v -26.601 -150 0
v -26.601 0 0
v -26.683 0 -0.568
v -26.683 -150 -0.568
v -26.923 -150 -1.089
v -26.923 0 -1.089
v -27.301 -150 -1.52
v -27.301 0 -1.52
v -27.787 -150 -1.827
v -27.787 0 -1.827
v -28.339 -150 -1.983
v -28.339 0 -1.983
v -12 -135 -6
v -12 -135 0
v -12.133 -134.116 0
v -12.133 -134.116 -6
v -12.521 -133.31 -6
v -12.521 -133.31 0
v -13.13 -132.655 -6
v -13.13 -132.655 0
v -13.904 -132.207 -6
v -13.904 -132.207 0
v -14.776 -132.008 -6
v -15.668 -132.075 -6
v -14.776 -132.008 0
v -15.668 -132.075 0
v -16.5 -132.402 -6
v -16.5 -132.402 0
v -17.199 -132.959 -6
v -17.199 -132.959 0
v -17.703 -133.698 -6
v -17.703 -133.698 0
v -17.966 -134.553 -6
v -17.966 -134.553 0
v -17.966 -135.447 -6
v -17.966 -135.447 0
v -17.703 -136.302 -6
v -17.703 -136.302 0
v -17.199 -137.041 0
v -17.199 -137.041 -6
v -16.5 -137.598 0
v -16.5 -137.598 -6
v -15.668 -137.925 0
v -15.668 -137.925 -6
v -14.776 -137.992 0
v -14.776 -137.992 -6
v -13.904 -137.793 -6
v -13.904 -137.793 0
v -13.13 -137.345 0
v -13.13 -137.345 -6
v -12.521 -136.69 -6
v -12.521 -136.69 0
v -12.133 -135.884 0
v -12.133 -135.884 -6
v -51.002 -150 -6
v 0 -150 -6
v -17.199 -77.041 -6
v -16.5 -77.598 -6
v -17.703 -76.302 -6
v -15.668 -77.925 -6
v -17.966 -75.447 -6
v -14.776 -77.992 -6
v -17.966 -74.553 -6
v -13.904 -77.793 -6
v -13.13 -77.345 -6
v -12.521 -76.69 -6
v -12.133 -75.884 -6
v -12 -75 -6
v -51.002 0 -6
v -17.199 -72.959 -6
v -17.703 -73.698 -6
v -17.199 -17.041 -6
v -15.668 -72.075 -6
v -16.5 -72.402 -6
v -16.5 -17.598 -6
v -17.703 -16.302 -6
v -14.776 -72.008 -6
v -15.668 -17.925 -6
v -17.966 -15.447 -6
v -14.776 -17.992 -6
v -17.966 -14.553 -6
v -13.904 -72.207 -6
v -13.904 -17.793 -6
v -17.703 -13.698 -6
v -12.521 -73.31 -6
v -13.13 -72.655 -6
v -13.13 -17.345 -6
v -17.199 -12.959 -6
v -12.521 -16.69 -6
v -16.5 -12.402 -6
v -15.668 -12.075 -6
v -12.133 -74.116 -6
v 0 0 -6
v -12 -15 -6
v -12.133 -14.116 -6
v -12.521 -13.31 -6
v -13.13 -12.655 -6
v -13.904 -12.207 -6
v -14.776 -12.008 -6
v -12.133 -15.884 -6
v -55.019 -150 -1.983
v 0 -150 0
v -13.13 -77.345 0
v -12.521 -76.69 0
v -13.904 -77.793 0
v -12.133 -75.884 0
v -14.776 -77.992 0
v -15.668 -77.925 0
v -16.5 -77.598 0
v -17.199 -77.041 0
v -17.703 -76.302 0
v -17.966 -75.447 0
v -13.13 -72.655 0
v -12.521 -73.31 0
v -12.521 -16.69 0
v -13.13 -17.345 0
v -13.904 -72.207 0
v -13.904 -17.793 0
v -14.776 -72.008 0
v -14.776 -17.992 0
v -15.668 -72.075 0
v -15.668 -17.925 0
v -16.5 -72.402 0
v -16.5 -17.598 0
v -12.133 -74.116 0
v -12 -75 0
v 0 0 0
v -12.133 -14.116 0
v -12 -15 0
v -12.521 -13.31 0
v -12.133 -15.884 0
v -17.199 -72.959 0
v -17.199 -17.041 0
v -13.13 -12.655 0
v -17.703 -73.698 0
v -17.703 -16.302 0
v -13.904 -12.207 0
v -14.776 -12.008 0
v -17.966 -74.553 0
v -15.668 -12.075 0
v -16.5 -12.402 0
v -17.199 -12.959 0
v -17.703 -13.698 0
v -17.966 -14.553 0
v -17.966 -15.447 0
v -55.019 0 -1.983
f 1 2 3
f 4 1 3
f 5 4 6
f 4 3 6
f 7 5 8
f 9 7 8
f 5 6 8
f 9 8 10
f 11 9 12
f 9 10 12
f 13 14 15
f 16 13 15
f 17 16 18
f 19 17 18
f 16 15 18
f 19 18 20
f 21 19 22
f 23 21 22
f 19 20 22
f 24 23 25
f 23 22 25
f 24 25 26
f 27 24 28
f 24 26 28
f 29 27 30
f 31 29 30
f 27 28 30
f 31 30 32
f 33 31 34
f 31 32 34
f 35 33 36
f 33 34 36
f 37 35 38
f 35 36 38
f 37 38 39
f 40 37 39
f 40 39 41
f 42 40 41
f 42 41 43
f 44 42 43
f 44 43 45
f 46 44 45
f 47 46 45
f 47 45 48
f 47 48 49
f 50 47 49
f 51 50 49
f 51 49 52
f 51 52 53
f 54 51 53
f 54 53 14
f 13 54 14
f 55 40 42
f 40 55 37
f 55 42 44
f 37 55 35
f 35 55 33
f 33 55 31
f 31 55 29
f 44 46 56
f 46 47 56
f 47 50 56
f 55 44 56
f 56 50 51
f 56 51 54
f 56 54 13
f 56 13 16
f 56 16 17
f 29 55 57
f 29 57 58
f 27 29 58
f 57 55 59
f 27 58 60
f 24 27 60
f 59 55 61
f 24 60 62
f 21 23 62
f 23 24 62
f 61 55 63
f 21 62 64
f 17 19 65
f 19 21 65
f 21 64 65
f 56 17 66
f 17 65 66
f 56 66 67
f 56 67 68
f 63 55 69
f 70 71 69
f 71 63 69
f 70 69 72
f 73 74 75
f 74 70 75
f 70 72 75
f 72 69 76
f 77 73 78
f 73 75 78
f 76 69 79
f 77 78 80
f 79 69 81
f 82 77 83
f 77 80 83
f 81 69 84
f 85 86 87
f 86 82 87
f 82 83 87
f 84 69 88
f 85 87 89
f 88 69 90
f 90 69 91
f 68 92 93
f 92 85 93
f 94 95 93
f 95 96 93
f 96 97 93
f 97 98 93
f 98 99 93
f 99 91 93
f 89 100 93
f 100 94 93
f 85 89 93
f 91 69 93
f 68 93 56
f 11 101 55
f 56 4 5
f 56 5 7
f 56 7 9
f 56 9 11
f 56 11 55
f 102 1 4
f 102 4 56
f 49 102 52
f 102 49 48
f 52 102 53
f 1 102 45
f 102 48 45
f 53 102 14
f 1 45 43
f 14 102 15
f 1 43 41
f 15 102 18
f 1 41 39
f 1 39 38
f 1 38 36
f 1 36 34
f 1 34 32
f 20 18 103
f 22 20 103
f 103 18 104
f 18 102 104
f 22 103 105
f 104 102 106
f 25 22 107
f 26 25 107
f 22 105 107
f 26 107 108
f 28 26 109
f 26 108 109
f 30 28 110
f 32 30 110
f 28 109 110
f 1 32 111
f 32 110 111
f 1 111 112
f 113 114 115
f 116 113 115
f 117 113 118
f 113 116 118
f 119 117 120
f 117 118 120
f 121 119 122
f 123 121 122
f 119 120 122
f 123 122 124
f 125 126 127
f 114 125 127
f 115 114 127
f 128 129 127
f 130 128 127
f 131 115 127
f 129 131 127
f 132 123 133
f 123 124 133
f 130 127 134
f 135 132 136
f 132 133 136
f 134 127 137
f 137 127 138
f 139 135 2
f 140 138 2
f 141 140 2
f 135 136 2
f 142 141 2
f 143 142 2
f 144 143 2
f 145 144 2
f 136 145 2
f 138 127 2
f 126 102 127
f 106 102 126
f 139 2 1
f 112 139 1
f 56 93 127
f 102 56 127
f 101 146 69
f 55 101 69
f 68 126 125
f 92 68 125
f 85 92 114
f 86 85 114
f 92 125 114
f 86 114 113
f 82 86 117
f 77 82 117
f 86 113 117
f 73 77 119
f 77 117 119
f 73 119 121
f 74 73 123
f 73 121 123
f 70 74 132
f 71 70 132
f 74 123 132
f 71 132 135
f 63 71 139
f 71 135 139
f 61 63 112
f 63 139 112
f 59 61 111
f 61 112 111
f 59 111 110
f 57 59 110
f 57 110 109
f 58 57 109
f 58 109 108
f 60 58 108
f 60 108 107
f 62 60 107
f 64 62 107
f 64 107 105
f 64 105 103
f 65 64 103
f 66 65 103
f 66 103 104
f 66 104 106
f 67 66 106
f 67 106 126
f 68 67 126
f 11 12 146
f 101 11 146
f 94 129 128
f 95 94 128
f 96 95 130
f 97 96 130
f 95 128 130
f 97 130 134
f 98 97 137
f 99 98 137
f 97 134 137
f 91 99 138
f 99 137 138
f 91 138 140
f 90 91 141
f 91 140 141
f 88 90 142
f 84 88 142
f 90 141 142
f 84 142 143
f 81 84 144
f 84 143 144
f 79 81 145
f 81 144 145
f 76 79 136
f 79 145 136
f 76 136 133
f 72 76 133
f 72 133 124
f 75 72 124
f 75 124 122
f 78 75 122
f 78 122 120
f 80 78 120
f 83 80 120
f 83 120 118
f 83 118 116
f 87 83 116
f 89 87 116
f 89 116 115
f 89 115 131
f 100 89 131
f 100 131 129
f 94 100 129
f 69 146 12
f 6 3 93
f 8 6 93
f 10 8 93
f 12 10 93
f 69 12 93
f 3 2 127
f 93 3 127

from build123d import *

# Parameters (mm, degrees)
F1_DEPTH = 150
F3_R     = 3
F4_DEPTH = 25


with BuildPart() as f1:
    # F0 (on Front) → F1 (new body)
    with BuildSketch(Plane.XZ):
        with BuildLine():
            Line((0, -6), (0, 0))
            Line((0, 0), (-26.600782156, 0))
            ThreePointArc((-26.600782156, 0), (-27.0968220332, -1.3183717037), (-28.338886105, -1.9827784693))
            Line((-28.338886105, -1.9827784693), (-55.0189449519, -1.9827784693))
            Line((-55.0189449519, -1.9827784693), (-51.0017234212, -6))
            Line((-51.0017234212, -6), (0, -6))
        make_face()
    extrude(amount=F1_DEPTH)

    # F3 (on offset) → F4 (cut)
    with BuildSketch(Plane.XY):
        with Locations((-15, -15)):
            Circle(F3_R)
        with Locations((-15, -135)):
            Circle(F3_R)
        with Locations((-15, -75)):
            Circle(F3_R)
    extrude(amount=-F4_DEPTH, mode=Mode.SUBTRACT)


solid = f1.part
